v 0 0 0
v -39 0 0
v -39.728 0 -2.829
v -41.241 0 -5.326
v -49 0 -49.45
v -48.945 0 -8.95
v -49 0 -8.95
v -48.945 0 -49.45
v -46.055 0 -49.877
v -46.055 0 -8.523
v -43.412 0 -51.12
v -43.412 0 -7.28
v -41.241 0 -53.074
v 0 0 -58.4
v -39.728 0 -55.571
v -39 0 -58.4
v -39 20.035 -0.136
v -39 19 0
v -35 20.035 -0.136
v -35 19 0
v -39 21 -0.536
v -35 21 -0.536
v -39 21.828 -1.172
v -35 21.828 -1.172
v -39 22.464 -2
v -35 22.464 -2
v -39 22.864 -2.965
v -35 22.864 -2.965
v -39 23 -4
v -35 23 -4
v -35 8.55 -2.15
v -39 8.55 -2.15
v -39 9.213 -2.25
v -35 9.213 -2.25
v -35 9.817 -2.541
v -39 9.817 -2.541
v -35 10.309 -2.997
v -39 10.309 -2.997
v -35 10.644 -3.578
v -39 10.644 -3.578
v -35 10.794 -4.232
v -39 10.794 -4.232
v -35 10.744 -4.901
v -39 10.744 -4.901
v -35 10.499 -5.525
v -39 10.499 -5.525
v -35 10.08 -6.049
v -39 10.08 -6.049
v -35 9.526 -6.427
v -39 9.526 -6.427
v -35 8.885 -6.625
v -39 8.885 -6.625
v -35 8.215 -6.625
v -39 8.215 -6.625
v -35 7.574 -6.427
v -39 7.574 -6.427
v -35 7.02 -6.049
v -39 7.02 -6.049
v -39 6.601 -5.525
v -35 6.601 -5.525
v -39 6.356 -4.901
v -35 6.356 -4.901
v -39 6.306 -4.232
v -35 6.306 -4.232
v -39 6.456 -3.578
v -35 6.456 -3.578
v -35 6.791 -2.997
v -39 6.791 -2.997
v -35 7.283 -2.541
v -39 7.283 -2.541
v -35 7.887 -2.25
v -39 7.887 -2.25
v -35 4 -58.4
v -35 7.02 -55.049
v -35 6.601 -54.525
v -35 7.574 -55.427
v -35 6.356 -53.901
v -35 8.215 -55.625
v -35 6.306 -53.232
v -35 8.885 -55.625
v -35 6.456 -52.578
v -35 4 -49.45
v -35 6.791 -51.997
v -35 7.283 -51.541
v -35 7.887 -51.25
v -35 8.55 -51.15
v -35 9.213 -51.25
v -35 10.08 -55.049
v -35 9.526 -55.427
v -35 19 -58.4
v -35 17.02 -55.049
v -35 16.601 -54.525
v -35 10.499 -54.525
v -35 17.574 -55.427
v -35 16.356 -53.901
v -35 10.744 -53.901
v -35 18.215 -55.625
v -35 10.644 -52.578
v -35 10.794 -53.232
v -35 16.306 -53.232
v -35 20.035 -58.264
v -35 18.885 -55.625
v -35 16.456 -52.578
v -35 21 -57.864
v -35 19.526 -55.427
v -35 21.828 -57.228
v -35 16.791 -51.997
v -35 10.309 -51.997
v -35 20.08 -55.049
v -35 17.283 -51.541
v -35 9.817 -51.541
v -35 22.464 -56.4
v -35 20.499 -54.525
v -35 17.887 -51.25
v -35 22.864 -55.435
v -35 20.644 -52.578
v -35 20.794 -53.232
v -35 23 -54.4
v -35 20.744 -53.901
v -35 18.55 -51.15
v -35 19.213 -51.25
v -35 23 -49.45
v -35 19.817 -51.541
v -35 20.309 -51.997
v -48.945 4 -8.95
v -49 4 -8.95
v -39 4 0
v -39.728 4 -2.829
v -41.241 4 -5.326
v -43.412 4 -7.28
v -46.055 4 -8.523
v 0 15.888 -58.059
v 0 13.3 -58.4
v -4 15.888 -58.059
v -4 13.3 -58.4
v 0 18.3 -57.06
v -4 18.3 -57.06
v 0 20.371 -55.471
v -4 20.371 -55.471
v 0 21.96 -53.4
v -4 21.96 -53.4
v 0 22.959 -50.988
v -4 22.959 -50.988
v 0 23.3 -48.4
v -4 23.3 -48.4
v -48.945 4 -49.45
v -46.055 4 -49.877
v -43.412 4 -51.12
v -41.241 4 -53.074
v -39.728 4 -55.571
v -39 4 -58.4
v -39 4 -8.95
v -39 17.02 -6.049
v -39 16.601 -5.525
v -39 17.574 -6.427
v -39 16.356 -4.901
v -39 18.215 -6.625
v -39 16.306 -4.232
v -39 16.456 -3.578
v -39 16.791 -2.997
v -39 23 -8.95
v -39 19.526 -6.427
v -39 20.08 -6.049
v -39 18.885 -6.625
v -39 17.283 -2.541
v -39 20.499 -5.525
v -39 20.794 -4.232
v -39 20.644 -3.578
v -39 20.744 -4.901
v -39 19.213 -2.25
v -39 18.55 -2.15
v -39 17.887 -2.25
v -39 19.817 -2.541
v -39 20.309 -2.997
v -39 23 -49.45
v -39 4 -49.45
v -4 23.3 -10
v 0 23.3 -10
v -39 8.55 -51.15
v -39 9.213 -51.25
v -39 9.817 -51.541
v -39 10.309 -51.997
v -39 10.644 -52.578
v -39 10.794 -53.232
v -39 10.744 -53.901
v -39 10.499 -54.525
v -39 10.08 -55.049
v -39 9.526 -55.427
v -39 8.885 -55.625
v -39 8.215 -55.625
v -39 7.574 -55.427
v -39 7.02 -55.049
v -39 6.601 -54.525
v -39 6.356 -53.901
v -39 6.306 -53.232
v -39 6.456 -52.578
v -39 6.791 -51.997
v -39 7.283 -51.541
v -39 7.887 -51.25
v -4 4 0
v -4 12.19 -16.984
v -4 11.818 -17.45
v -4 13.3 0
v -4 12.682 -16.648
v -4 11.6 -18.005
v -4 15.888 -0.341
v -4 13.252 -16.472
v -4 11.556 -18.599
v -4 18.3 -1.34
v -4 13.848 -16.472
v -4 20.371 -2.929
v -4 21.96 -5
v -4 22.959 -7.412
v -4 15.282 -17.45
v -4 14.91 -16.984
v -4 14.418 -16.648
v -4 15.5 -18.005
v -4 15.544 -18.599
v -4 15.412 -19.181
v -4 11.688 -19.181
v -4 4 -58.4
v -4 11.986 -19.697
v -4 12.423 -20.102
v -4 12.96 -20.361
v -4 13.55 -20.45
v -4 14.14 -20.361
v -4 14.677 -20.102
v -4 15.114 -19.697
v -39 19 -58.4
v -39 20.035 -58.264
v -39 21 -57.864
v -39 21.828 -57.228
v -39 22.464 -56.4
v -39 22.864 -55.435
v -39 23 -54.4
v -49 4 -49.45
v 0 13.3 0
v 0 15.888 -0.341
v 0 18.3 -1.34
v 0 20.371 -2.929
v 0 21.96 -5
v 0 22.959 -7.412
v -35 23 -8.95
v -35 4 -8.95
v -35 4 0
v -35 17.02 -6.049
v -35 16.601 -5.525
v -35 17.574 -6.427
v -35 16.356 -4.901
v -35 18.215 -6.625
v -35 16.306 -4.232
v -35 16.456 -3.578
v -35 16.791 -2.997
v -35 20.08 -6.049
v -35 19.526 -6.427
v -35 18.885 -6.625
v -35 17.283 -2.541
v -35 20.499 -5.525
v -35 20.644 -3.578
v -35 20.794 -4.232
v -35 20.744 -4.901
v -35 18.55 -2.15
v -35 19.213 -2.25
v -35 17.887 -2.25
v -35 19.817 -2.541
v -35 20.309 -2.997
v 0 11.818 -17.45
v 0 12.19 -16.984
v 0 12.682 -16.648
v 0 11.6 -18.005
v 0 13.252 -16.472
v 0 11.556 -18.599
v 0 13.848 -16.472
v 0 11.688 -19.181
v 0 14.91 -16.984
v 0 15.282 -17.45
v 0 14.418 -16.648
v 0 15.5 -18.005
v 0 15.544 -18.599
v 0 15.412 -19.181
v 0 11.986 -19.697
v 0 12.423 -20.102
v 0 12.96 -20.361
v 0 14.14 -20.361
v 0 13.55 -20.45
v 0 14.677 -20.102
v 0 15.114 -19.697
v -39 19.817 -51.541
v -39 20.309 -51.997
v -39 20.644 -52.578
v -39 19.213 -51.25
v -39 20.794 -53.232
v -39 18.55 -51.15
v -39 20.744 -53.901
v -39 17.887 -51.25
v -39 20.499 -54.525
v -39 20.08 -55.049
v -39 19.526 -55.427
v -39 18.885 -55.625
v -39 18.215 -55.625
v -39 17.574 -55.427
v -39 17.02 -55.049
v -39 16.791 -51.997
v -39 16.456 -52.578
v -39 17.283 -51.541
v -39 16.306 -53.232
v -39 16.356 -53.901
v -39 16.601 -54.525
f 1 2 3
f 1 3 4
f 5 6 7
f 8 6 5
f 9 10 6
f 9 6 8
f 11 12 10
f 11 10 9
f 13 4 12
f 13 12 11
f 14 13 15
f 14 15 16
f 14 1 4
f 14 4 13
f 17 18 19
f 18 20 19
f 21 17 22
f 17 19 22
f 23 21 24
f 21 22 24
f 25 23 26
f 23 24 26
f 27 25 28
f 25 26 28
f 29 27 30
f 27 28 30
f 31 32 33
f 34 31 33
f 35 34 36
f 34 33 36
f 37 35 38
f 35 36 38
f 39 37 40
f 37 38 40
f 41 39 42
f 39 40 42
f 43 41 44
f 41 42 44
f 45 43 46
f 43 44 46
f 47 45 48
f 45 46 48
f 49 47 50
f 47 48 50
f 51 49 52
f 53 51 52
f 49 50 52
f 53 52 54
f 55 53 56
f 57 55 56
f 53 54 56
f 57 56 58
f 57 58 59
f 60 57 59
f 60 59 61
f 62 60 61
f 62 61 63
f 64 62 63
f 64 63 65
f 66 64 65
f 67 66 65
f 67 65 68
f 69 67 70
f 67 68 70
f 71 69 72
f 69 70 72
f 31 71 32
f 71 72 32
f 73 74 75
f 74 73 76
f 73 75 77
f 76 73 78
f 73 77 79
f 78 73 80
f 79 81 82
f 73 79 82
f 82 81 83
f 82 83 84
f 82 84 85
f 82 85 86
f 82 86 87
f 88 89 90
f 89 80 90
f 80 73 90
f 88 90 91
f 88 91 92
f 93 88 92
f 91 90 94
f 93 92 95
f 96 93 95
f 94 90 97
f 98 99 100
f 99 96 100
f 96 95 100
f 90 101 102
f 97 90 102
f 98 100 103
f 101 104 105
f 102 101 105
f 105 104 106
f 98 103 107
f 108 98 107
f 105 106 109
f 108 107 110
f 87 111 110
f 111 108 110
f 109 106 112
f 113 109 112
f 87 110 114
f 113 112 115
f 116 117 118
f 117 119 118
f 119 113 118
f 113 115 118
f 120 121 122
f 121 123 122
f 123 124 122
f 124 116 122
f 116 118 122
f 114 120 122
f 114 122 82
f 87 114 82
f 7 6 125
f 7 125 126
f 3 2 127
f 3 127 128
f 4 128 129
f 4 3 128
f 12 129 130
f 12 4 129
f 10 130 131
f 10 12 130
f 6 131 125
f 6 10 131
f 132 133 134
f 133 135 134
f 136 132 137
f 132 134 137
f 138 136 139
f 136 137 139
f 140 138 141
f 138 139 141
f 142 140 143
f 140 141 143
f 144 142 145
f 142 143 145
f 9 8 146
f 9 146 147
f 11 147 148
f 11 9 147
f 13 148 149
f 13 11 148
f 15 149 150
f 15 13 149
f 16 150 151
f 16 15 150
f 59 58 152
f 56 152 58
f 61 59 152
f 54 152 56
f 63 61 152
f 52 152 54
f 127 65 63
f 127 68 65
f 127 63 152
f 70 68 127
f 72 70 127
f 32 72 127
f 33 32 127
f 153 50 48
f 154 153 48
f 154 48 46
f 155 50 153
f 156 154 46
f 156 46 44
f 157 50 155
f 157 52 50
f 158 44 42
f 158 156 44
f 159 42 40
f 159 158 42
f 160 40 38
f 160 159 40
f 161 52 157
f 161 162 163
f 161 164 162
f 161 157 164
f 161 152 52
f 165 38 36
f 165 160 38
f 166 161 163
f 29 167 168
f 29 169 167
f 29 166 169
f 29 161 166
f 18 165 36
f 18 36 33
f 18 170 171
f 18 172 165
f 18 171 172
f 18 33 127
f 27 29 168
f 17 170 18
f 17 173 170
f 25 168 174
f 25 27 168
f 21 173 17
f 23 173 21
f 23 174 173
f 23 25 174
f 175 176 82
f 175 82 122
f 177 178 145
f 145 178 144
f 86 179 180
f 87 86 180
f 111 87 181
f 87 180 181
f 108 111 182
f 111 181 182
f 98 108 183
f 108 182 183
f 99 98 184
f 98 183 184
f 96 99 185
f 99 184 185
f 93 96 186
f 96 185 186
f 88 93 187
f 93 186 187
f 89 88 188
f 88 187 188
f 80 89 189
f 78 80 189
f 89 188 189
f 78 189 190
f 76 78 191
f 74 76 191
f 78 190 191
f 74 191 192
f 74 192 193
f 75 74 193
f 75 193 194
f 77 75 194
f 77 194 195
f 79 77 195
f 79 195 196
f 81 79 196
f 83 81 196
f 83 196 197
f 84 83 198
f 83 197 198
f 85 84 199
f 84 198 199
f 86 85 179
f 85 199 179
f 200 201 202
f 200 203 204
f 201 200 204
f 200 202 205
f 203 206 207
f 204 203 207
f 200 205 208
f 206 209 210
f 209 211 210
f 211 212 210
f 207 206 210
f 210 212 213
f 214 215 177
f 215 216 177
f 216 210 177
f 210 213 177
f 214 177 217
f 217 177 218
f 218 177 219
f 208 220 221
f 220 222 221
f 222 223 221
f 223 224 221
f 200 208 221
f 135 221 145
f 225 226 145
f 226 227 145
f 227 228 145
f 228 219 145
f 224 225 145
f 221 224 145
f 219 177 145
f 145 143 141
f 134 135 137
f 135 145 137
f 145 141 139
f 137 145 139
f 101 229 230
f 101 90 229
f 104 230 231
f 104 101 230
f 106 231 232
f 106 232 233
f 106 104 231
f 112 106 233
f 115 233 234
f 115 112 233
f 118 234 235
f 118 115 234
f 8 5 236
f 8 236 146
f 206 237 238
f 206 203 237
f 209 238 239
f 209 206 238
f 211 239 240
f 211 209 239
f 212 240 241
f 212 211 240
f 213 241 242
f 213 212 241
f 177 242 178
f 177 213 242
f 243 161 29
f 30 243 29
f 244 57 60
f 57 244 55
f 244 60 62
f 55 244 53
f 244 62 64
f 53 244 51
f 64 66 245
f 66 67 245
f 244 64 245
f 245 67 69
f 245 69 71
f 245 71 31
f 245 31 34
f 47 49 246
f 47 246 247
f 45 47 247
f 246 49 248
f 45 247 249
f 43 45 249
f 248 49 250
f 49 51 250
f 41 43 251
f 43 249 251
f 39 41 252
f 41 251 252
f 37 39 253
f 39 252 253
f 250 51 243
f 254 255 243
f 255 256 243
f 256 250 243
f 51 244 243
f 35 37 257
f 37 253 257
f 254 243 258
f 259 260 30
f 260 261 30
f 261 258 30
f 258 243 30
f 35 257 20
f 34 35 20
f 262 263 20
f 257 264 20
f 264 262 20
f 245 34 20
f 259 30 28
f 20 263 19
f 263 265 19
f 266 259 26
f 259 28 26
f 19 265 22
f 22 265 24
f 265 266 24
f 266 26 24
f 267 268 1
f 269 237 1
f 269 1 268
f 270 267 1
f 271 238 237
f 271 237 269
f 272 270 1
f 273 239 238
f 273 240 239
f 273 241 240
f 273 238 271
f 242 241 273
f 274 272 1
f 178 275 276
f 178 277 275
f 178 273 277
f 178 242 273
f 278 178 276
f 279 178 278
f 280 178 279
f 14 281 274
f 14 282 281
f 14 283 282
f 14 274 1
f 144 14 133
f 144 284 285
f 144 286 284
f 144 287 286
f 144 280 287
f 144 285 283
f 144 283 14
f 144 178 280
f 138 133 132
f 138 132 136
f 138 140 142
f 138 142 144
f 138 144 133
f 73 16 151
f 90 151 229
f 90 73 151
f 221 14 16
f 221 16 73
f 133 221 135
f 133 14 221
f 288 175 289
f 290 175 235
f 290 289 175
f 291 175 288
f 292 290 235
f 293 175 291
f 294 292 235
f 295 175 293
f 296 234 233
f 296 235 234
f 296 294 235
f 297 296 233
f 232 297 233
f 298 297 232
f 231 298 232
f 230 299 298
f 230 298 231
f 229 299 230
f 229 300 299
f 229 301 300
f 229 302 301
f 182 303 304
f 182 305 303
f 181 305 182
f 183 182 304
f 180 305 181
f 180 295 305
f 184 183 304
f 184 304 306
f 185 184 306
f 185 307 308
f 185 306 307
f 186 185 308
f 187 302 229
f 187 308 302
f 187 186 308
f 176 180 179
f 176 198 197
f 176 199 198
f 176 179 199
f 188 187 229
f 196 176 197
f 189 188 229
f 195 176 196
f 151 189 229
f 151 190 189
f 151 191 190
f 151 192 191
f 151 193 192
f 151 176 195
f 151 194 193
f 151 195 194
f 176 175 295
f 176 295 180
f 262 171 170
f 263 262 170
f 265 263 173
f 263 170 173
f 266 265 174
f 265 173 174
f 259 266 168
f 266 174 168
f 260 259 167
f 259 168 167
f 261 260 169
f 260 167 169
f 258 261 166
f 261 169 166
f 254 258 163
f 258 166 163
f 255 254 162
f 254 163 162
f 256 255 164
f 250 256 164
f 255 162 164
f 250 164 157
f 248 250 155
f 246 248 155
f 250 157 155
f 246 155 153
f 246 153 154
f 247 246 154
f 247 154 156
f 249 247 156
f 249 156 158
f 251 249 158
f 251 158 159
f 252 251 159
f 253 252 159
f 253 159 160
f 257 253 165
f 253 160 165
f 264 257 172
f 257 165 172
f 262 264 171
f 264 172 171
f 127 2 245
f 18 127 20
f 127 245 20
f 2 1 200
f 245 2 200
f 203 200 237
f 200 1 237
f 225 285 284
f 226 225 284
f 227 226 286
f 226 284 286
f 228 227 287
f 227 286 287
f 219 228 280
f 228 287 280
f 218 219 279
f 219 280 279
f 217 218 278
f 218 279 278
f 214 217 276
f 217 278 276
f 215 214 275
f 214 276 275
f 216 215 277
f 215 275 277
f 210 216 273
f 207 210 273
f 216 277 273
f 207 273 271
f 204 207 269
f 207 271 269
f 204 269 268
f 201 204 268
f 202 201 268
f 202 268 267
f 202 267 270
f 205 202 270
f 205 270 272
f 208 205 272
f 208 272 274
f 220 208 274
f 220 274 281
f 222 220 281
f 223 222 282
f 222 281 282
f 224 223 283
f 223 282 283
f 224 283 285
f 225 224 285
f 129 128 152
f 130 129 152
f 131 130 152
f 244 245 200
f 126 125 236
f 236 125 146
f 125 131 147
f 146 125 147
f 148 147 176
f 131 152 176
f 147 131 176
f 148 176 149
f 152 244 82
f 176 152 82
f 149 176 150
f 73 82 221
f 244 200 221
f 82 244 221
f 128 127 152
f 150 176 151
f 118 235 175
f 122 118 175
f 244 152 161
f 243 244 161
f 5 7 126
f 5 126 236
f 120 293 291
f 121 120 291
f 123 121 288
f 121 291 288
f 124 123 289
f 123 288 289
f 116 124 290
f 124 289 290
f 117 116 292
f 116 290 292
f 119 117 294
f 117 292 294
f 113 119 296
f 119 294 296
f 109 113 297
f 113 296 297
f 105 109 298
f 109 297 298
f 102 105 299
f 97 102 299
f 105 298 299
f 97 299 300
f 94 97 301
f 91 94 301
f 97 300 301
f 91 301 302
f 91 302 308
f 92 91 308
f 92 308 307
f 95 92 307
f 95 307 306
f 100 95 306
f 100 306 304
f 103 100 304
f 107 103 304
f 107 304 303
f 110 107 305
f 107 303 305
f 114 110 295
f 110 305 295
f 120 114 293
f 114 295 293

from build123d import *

# Parameters (mm, degrees)
BOSS_EXTRUDE1_DEPTH = 4
SKETCH2_W           = 8.95
SKETCH2_H           = 19
SKETCH2_R           = 2.25
BOSS_EXTRUDE2_DEPTH = 4
FILLET1_R           = 10
FILLET2_R           = 4
SKETCH3_W           = 58.4
SKETCH3_H           = 19.3
SKETCH3_R           = 2
BOSS_EXTRUDE3_DEPTH = 4
FILLET3_R           = 10


with BuildPart() as part:
    # Sketch1 → Boss-Extrude1 (new body)
    with BuildSketch(Plane(origin=(0, 0, 0), x_dir=(1, 0, 0), z_dir=(0, 1, 0))):
        Polygon((-49, 49.45), (-39, 49.45), (-39, 58.4), (0, 58.4), (0, 0), (-39, 0), (-39, 8.95), (-49, 8.95), align=None)
    extrude(amount=BOSS_EXTRUDE1_DEPTH)

    # Sketch2 → Boss-Extrude2 (add)
    # profile 1 of 2: a face of its own
    with BuildSketch(Plane.ZY.offset(39)):
        with Locations((-4.475, 13.5)):
            Rectangle(SKETCH2_W, SKETCH2_H)
        with Locations((-4.4, 18.55)):
            Circle(SKETCH2_R, mode=Mode.SUBTRACT)
        with Locations((-4.4, 8.55)):
            Circle(SKETCH2_R, mode=Mode.SUBTRACT)
    # profile 2 of 2: a face of its own
    with BuildSketch(Plane.ZY.offset(39)):
        with Locations((-53.925, 13.5)):
            Rectangle(SKETCH2_W, SKETCH2_H)
        with Locations((-53.4, 18.55)):
            Circle(SKETCH2_R, mode=Mode.SUBTRACT)
        with Locations((-53.4, 8.55)):
            Circle(SKETCH2_R, mode=Mode.SUBTRACT)
    extrude(amount=-BOSS_EXTRUDE2_DEPTH)

    # Fillet1
    # the kernel refuses this fillet: 10 mm, written as the material it adds along each edge
    with BuildSketch(Plane(origin=(-39, 0, -49.45), x_dir=(-1, 0, 0), z_dir=(0, 1, 0))) as fillet1_piece_1:
        with BuildLine():
            CenterArc((9.944722218, -10), FILLET1_R, 90, 83.97283344)
            Line((0, -8.95), (0, 0))
            Line((0, 0), (9.944722218, 0))
        make_face()
    extrude(amount=4)
    with BuildSketch(Plane(origin=(-39, 0, -8.95), x_dir=(0, 0, 1), z_dir=(0, 1, 0))) as fillet1_piece_2:
        with BuildLine():
            CenterArc((10, -9.944722218), FILLET1_R, 96.02716656, 83.97283344)
            Line((0, -9.944722218), (0, 0))
            Line((0, 0), (8.95, 0))
        make_face()
    extrude(amount=4)

    # Fillet2
    fillet2_edges = [part.edges().sort_by_distance(p)[0] for p in [
        (-37, 23, 0),
        (-37, 23, -58.4),
    ]]
    fillet(fillet2_edges, radius=FILLET2_R)

    # Sketch3 → Boss-Extrude3 (add)
    with BuildSketch(Plane(origin=(0, 0, 0), x_dir=(0, 0, -1), z_dir=(1, 0, 0))):
        with Locations((29.2, 13.65)):
            Rectangle(SKETCH3_W, SKETCH3_H)
        with Locations((18.45, 13.55)):
            Circle(SKETCH3_R, mode=Mode.SUBTRACT)
    extrude(amount=-BOSS_EXTRUDE3_DEPTH)

    # Fillet3
    fillet3_edges = [part.edges().sort_by_distance(p)[0] for p in [
        (-2, 23.3, 0),
        (-2, 23.3, -58.4),
    ]]
    fillet(fillet3_edges, radius=FILLET3_R)


solid = part.part
